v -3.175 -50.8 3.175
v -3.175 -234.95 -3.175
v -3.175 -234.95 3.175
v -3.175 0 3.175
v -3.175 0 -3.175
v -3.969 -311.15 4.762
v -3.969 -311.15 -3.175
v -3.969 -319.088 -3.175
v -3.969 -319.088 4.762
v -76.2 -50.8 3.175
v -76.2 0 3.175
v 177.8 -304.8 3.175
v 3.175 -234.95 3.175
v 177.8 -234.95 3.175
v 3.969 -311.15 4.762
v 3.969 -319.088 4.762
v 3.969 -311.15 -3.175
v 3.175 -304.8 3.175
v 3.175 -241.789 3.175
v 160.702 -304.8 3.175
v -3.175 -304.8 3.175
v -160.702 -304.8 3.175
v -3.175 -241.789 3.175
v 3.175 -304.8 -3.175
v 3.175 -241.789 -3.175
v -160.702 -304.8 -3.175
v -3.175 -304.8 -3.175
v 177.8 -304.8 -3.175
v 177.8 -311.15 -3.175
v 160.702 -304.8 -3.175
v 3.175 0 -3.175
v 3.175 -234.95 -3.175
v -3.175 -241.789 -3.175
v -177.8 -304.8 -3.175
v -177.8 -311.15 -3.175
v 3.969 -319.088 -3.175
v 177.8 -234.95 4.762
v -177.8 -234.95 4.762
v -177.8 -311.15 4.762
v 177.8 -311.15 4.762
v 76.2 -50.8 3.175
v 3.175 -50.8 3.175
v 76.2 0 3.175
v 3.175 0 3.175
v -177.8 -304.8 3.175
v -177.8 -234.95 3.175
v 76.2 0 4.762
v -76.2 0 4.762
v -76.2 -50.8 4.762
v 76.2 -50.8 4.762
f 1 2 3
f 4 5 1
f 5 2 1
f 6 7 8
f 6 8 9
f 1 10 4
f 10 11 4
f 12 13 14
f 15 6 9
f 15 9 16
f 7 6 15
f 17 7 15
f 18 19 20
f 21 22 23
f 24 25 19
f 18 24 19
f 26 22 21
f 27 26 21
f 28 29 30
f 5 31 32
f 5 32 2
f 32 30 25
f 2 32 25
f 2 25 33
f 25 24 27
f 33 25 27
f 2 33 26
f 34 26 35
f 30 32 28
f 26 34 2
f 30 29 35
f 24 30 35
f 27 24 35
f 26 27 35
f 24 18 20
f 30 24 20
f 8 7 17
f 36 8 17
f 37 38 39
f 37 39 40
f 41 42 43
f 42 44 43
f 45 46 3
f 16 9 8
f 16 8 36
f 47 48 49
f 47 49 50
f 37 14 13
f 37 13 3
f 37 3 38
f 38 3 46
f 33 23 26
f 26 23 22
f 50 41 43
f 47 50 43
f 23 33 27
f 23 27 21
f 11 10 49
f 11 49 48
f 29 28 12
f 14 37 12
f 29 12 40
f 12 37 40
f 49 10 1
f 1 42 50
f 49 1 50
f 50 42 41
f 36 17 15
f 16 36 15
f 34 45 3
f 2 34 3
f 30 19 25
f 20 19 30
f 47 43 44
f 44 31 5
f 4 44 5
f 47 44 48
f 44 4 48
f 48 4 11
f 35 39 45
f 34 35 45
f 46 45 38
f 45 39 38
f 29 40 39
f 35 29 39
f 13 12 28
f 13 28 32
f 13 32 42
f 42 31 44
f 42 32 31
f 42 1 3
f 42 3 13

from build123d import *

# Parameters (mm, degrees)
F0_W      = 6.35
F0_H      = 6.35
F1_DEPTH  = 304.8
F2_W      = 73.025
F2_H      = 50.8
F2_W_2    = 6.35
F3_DEPTH  = 1.5875
F4_W      = 6.35
F4_H      = 69.85
F5_DEPTH  = 1.5875
F7_DEPTH  = 6.35
F9_DEPTH  = 6.35
F11_W     = 7.9375
F11_H     = 7.9375
F12_DEPTH = 7.9375


# Not quite as in the source:
# - a length typed as a fraction of an inch, garbled in the dataset ("3 / 203.2 mm" for 3/8 in), is restored


with BuildPart() as f1:
    # F0 (on Front) → F1 (new body)
    with BuildSketch(Plane.XZ):
        Rectangle(F0_W, F0_H)
    extrude(amount=F1_DEPTH)

    # F2 (on face) → F3 (join)
    with BuildSketch(Plane.XY.offset(3.175)):
        with Locations((39.6875, -25.4)):
            Rectangle(F2_W, F2_H)
        with Locations((-39.6875, -25.4)):
            Rectangle(F2_W, F2_H)
        with Locations((0, -25.4)):
            Rectangle(F2_W_2, F2_H)
    extrude(amount=F3_DEPTH)

    # F4 (on face) → F5 (join)
    with BuildSketch(Plane.XY.offset(3.175)):
        Polygon((-3.175, -234.95), (-177.8, -234.95), (-177.8, -311.15), (177.8, -311.15), (177.8, -234.95), (3.175, -234.95), (3.175, -304.8), (-3.175, -304.8), align=None)
        with Locations((0, -269.875)):
            Rectangle(F4_W, F4_H)
    extrude(amount=F5_DEPTH)

    # F6 (on face) → F7 (join)
    with BuildSketch(Plane(origin=(0, 0, 3.175), x_dir=(1, 0, 0), z_dir=(0, 0, -1))):
        Polygon((-177.8, 311.15), (-177.8, 304.8), (-3.175, 304.8), (3.175, 304.8), (177.8, 304.8), (177.8, 311.15), align=None)
    extrude(amount=F7_DEPTH)

    # F8 (on face) → F9 (join)
    with BuildSketch(Plane(origin=(0, 0, 3.175), x_dir=(1, 0, 0), z_dir=(0, 0, -1))):
        Polygon((-177.8, 304.8), (-3.175, 234.95), (-3.175, 241.7891593051), (-160.7021017373, 304.8), align=None)
    extrude(amount=F9_DEPTH)

    # F10: F1 across plane


with BuildPart() as f1_1:
    add(f1.part)
    add(f1.part.mirror(Plane.YZ))


with BuildPart() as f12:
    # F11 (on face) → F12 (new body)
    with BuildSketch(Plane.XZ.offset(311.15)):
        with Locations((0, 0.79375)):
            Rectangle(F11_W, F11_H)
    extrude(amount=F12_DEPTH)


solid = Compound([f1_1.part, f12.part])
